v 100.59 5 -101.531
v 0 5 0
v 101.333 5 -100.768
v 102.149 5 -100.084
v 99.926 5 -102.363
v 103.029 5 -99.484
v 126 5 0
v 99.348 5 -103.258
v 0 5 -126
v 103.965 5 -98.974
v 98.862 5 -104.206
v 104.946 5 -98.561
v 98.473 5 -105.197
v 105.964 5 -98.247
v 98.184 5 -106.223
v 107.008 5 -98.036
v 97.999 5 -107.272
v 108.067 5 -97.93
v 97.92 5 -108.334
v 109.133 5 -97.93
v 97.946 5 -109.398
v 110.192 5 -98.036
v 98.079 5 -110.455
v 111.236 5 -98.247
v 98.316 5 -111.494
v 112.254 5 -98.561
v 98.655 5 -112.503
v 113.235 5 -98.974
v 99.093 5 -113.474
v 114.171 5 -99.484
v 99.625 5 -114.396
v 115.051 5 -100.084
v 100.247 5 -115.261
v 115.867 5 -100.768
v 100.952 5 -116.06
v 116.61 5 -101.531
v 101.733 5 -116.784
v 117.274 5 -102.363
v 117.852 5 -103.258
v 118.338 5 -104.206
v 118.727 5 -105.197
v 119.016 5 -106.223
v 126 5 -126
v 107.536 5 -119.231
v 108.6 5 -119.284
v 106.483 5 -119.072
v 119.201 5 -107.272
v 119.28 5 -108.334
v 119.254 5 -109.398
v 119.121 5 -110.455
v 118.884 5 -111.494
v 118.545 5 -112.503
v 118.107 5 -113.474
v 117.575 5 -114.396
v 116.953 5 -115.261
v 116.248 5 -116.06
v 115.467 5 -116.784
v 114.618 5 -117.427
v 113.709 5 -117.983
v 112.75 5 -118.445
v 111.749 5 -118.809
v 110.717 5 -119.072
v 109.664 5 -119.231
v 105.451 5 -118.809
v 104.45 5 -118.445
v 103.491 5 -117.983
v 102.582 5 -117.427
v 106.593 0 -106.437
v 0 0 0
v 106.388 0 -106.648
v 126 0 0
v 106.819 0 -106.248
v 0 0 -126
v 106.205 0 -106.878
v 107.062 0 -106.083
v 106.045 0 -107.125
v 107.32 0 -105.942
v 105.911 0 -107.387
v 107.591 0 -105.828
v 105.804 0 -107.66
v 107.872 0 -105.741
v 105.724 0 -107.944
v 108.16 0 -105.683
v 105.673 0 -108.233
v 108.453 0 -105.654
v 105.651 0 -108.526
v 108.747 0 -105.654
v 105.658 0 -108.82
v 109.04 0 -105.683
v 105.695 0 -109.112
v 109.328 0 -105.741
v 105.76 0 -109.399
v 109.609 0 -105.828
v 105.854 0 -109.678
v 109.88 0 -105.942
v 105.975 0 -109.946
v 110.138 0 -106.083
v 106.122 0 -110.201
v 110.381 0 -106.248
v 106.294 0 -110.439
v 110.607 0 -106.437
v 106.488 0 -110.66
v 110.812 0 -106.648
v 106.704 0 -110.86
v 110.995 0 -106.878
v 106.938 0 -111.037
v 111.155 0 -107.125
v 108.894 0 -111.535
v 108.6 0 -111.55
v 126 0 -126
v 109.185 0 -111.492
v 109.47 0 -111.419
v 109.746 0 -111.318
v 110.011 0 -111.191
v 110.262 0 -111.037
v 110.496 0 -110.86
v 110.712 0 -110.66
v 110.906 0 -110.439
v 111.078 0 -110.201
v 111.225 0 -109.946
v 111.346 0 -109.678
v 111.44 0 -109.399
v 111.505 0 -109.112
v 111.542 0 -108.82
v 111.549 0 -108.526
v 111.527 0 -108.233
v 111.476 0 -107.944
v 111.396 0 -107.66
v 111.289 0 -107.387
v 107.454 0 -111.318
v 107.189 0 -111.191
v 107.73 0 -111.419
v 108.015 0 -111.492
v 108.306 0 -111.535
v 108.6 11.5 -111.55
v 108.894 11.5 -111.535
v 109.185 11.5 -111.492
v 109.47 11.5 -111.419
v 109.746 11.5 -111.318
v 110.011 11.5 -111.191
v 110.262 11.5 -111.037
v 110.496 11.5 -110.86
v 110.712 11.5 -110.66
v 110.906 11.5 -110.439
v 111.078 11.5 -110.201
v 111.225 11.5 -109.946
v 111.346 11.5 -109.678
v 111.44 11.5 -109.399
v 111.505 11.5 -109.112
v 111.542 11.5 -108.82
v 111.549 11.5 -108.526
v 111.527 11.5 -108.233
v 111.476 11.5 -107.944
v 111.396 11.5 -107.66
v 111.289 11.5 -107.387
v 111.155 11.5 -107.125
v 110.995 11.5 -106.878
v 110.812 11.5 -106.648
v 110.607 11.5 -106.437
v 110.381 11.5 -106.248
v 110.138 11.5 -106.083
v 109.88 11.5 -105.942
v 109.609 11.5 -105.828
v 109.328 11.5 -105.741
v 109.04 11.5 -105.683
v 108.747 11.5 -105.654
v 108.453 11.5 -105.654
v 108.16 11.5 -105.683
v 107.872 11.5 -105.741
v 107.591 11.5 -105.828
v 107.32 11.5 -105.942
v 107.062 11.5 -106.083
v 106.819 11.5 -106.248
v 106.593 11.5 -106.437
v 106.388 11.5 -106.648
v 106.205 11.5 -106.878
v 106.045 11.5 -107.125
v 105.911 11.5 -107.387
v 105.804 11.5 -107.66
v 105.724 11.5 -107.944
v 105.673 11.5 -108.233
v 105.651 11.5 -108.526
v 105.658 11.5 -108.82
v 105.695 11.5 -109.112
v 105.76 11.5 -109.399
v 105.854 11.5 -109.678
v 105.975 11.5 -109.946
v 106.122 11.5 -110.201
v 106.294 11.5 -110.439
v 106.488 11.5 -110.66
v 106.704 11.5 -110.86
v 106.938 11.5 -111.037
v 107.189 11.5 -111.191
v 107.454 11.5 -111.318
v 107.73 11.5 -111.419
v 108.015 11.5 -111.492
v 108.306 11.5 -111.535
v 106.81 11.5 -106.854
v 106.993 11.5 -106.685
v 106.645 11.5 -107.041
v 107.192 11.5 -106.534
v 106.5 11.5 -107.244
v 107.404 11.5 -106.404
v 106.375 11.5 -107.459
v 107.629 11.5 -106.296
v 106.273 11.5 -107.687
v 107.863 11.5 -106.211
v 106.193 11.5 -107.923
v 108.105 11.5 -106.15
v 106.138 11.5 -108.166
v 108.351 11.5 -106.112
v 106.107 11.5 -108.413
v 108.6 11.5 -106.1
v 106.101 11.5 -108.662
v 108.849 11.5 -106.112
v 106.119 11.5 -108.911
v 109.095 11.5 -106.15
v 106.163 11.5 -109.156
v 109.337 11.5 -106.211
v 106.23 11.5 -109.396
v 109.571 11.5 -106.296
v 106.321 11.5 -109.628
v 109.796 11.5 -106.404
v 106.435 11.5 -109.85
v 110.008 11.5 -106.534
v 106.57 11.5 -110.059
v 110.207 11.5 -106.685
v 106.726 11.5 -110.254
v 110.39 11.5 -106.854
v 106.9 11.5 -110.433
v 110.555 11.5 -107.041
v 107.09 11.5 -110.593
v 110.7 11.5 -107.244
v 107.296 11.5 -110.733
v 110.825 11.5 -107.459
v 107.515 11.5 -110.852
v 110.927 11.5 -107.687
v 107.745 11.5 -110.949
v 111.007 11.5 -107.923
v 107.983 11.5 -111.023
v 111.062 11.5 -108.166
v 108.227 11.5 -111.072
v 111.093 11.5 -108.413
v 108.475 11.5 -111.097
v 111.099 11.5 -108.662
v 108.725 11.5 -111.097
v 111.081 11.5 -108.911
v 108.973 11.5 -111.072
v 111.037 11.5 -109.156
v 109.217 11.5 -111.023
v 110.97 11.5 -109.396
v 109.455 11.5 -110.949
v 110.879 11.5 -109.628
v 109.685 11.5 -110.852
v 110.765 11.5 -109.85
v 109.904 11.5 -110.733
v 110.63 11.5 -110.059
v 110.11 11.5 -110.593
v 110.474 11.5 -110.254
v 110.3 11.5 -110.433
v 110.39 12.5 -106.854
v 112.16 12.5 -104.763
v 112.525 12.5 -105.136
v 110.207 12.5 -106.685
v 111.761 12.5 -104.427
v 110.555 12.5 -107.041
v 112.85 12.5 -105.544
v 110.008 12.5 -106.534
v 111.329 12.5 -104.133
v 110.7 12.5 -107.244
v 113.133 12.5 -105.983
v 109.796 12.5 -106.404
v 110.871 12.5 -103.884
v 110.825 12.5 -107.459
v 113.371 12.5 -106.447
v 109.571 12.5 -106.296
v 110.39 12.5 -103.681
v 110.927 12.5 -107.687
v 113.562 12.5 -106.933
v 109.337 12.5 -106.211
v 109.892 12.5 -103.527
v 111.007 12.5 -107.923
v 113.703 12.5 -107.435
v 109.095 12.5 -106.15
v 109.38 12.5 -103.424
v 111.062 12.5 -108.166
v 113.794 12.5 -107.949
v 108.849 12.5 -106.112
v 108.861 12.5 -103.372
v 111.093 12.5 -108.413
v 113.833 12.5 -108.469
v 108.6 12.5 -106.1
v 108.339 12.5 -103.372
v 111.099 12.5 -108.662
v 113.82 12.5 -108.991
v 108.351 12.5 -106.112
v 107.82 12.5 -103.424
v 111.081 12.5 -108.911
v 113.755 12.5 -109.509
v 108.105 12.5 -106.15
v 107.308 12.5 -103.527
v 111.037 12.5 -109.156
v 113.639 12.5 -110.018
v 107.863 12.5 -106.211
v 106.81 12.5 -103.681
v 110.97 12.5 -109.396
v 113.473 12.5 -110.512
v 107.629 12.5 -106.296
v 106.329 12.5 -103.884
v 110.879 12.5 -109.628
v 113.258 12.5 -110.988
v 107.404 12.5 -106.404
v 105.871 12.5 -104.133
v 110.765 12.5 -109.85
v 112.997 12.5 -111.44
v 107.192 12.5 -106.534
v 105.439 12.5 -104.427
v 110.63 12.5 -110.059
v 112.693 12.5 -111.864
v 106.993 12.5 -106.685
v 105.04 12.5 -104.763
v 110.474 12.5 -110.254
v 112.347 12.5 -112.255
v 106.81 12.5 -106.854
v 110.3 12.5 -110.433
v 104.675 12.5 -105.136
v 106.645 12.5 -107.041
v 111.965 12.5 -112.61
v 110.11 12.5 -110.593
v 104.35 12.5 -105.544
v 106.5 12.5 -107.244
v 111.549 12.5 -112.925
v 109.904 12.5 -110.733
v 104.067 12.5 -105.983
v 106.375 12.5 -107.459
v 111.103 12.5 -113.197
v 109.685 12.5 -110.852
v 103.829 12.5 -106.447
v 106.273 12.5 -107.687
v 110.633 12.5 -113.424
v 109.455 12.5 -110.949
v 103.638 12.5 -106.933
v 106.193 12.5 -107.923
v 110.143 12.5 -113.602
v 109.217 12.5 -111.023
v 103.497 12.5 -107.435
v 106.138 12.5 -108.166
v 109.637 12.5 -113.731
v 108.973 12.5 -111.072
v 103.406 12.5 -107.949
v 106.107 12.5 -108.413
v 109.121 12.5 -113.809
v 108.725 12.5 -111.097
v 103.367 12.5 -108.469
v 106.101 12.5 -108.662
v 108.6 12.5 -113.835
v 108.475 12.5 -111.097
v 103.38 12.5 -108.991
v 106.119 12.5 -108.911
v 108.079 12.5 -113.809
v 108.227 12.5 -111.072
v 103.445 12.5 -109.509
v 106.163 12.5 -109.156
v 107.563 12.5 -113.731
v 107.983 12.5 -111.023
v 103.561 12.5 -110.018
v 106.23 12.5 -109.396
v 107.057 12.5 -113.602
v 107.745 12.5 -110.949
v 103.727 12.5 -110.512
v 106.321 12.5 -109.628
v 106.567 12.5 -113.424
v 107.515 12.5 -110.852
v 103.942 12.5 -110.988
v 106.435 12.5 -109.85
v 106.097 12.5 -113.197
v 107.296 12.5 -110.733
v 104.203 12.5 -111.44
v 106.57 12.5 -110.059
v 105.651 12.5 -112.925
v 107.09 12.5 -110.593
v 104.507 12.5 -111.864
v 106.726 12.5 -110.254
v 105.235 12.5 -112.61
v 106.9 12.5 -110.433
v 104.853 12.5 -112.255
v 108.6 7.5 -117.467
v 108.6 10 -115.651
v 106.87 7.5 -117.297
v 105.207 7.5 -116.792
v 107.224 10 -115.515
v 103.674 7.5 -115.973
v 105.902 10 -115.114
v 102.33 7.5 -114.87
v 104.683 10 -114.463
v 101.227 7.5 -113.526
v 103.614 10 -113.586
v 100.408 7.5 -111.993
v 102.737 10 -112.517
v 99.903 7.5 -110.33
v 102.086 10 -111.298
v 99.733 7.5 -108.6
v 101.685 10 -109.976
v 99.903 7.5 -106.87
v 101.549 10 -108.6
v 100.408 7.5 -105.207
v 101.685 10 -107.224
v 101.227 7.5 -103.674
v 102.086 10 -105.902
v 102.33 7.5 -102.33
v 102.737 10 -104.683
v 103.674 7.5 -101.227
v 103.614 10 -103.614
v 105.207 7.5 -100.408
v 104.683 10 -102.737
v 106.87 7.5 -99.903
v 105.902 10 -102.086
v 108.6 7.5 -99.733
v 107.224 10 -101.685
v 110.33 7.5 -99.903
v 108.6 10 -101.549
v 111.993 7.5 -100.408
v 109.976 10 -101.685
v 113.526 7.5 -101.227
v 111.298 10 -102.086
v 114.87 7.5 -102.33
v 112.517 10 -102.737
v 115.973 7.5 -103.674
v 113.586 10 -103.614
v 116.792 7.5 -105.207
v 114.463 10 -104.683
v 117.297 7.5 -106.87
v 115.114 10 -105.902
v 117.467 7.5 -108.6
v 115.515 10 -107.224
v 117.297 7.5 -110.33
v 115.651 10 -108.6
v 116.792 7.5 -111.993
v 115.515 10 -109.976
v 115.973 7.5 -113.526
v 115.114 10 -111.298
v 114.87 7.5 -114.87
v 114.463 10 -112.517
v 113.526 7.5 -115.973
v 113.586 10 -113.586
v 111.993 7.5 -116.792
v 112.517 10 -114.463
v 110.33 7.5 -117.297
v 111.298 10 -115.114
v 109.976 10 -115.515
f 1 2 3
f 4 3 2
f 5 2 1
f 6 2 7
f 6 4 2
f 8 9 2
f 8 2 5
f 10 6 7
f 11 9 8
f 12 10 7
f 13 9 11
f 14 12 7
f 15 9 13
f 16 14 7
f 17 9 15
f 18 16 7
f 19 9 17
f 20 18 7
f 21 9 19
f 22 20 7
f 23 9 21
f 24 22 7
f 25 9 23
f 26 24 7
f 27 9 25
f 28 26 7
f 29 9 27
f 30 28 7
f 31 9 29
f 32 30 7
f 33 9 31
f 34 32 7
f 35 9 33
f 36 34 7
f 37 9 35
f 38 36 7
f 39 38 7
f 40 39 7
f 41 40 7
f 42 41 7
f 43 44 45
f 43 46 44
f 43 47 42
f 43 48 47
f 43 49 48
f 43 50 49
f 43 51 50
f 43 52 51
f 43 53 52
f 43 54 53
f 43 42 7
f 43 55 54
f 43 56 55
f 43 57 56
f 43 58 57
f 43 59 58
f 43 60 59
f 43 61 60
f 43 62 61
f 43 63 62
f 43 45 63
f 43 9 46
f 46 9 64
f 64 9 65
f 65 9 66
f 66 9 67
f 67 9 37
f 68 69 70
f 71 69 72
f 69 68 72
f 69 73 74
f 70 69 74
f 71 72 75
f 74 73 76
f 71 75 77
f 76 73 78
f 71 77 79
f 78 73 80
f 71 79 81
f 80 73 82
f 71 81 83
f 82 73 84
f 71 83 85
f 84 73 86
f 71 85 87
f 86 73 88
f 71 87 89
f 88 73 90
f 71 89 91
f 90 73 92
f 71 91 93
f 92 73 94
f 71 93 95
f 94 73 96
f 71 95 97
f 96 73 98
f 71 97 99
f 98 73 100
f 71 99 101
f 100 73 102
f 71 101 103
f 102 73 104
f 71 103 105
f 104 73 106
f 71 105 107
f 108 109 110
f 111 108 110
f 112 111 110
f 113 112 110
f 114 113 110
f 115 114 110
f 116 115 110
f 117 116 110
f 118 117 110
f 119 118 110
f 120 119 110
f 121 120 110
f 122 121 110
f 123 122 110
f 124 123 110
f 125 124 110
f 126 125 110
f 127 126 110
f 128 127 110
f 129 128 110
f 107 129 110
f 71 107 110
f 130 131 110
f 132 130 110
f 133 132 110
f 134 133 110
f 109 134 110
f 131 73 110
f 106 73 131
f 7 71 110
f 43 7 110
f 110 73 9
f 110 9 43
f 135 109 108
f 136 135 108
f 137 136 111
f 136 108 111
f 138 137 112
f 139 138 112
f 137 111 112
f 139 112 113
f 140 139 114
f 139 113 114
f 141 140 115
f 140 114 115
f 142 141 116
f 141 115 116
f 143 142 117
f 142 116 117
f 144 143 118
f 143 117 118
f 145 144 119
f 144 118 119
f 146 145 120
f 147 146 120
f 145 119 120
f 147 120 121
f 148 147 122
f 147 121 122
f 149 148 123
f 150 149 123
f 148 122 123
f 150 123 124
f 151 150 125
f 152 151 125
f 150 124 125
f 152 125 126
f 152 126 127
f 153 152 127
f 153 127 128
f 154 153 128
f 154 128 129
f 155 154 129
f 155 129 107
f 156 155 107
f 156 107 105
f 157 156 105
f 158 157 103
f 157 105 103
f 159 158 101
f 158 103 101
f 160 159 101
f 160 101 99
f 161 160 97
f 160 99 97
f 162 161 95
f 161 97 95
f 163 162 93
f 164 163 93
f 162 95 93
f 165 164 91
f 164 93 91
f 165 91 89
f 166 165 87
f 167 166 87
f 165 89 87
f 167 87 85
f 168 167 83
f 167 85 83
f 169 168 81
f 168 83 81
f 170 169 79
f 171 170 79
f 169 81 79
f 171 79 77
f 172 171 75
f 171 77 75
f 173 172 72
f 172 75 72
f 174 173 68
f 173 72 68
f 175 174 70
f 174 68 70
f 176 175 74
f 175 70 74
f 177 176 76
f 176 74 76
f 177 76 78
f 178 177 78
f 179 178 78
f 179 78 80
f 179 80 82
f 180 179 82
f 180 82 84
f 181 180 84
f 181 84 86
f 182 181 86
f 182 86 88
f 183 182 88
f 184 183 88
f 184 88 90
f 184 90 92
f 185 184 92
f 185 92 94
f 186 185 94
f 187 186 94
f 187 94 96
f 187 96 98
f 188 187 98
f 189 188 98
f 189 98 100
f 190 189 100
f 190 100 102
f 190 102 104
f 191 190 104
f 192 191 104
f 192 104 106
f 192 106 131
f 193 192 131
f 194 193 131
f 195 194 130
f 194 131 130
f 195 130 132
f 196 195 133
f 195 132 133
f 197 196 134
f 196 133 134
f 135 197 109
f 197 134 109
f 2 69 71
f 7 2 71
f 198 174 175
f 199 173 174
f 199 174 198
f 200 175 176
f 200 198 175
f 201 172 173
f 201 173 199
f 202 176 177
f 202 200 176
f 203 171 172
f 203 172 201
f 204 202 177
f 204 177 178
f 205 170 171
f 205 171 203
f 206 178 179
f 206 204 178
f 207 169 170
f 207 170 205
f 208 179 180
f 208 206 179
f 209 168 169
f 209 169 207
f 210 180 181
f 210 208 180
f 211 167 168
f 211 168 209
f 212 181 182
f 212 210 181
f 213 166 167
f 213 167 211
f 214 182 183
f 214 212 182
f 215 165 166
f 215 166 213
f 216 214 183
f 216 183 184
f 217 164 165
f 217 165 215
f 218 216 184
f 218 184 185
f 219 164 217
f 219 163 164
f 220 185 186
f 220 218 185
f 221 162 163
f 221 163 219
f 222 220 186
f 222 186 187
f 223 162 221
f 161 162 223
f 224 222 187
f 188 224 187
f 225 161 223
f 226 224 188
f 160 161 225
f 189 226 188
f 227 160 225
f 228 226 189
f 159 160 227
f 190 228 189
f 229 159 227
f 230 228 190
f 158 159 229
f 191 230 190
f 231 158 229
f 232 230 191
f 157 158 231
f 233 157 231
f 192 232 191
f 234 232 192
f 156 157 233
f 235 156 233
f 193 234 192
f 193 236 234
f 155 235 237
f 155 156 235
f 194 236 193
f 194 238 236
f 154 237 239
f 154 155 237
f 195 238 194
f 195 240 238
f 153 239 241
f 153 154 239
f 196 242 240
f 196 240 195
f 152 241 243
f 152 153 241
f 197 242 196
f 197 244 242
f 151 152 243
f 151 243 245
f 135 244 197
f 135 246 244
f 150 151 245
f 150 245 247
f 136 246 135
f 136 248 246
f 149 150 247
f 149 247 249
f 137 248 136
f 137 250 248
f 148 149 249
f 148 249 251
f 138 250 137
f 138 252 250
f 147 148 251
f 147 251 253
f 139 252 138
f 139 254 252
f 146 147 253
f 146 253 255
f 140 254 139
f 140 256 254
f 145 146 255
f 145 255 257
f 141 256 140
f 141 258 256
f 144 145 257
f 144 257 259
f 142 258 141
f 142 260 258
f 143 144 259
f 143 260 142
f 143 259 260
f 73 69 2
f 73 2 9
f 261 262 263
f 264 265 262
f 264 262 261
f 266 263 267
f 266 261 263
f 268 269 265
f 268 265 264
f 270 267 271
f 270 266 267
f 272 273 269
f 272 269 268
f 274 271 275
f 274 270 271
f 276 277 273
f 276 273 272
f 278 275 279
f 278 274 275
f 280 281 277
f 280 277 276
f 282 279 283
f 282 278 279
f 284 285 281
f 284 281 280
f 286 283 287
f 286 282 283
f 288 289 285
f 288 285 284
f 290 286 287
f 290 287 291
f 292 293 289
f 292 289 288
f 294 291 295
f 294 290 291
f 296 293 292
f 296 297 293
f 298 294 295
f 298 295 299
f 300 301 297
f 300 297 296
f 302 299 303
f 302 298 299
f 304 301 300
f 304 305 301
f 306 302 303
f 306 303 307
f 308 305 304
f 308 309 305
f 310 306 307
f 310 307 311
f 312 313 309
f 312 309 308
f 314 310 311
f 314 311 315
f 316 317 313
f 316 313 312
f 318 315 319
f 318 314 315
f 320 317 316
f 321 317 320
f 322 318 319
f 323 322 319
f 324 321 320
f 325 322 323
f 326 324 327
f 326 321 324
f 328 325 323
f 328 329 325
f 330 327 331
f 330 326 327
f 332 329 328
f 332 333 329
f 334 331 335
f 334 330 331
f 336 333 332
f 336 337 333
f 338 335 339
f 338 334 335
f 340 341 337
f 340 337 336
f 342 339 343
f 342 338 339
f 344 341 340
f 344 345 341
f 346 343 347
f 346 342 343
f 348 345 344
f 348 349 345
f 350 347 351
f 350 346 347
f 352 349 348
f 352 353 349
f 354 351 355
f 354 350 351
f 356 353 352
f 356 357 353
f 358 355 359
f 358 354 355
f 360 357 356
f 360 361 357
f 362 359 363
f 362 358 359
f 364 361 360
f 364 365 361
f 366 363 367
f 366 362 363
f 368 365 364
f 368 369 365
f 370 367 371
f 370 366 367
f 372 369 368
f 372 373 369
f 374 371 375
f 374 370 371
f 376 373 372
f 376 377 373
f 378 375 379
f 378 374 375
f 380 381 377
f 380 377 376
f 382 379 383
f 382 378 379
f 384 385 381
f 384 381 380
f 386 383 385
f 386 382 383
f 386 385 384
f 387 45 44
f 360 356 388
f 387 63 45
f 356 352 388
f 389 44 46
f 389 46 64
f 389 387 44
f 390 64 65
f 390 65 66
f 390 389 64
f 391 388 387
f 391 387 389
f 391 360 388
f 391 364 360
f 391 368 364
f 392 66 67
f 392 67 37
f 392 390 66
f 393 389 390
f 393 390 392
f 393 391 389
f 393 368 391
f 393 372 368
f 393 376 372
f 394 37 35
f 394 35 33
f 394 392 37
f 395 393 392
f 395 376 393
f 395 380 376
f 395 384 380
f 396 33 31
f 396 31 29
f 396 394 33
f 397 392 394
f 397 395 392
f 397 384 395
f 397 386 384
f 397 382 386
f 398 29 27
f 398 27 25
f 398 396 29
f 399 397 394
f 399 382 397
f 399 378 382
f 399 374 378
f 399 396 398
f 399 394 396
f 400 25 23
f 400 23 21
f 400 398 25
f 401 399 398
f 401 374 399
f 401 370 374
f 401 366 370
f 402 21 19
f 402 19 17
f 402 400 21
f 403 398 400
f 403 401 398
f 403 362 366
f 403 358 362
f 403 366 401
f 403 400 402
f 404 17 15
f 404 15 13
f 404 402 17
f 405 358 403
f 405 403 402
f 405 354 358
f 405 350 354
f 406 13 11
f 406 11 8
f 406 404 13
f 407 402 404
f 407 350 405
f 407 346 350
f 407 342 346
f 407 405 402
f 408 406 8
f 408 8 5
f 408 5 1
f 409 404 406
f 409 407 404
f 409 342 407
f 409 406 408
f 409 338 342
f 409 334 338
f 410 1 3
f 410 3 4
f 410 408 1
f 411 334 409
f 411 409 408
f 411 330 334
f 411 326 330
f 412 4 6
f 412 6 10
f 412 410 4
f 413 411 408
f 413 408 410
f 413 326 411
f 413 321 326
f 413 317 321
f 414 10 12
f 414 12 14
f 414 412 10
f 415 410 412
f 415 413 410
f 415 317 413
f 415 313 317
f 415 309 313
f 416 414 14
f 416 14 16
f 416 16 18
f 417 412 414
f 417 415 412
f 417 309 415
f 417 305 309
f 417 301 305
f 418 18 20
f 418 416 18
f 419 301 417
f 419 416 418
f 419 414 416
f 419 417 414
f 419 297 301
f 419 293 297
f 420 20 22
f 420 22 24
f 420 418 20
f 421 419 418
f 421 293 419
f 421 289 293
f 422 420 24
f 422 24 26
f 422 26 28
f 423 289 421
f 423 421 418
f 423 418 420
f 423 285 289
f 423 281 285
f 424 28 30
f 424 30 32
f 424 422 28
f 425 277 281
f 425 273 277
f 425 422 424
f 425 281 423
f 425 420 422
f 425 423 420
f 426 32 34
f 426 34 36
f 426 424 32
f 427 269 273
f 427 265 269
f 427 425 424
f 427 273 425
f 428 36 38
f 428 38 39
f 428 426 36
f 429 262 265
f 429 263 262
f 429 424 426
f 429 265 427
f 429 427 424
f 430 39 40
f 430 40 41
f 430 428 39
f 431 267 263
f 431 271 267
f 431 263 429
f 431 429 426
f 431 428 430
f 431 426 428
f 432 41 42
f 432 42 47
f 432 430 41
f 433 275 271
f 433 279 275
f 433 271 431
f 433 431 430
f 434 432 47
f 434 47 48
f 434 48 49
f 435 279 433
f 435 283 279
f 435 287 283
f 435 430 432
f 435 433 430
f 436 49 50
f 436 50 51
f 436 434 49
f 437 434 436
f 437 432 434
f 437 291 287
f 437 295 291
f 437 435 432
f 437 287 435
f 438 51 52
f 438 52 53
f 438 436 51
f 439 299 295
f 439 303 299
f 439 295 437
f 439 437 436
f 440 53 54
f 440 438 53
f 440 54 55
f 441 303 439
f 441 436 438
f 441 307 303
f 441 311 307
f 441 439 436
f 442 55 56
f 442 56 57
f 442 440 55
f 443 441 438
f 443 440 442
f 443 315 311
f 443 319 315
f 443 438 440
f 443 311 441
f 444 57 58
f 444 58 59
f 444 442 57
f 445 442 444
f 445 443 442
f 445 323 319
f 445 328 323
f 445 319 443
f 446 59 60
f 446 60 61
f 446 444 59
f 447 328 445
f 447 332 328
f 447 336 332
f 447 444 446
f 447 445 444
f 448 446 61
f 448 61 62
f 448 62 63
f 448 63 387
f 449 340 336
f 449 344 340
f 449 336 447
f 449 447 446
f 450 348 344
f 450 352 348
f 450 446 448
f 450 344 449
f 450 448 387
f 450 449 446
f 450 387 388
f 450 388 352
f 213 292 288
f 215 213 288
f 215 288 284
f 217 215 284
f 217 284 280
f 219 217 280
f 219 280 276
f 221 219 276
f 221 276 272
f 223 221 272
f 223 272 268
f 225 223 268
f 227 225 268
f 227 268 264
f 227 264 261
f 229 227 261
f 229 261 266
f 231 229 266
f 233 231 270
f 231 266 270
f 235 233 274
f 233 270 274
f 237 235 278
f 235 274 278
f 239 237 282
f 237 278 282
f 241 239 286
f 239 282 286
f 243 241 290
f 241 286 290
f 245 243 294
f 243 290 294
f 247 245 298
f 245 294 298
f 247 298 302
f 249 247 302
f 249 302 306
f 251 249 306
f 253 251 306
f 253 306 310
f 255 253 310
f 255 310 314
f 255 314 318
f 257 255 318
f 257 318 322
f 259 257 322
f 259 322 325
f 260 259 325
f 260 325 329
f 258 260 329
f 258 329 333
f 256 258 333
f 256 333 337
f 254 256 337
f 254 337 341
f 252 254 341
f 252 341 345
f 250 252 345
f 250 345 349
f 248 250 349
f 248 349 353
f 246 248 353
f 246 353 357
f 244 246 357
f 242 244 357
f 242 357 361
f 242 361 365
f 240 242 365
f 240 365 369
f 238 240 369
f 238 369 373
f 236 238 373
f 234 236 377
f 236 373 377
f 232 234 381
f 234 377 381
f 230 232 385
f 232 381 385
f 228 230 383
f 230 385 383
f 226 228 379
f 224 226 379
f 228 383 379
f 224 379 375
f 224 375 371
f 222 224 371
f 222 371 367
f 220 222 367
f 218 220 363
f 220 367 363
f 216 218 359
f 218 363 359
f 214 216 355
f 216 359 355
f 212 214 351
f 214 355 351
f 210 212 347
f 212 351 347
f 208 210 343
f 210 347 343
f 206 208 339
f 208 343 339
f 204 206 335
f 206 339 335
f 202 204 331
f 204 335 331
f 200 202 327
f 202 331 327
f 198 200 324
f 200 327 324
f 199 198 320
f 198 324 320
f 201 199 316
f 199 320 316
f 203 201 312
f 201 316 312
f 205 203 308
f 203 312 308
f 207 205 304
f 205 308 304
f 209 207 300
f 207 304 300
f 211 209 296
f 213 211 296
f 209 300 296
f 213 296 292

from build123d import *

# Parameters (mm, degrees)
SKETCH1_W           = 126
SKETCH1_H           = 126
BOSS_EXTRUDE1_DEPTH = 5
SKETCH3_R           = 12.5
BOSS_EXTRUDE2_DEPTH = 7.5
SKETCH4_R           = 2.95
CUT_EXTRUDE1_DEPTH  = 11.5
SKETCH6_R           = 2.5
CUT_EXTRUDE2_DEPTH  = 179.628805068
CHAMFER1_SIZE       = 10
CHAMFER1_SIZE_2     = 7.26542528


with BuildPart() as part:
    # Sketch1 → Boss-Extrude1 (new body)
    with BuildSketch(Plane(origin=(0, 0, 0), x_dir=(1, 0, 0), z_dir=(0, 1, 0))):
        with Locations((63, 63)):
            Rectangle(SKETCH1_W, SKETCH1_H)
    extrude(amount=BOSS_EXTRUDE1_DEPTH)

    # Sketch3 → Boss-Extrude2 (add)
    with BuildSketch(Plane(origin=(0, 5, 0), x_dir=(1, 0, 0), z_dir=(0, 1, 0))):
        with Locations(Location((108.6, 108.6, 0), (0, 0, 90))):
            Circle(SKETCH3_R)
    extrude(amount=BOSS_EXTRUDE2_DEPTH)

    # Sketch4 → Cut-Extrude1 (cut)
    with BuildSketch(Plane.XZ):
        with Locations(Location((108.6, -108.6, 0), (0, 0, 270))):
            Circle(SKETCH4_R)
    extrude(amount=-CUT_EXTRUDE1_DEPTH, mode=Mode.SUBTRACT)

    # Sketch6 → Cut-Extrude2 (cut, through all)
    with BuildSketch(Plane(origin=(0, 12.5, 0), x_dir=(1, 0, 0), z_dir=(0, 1, 0))):
        with Locations(Location((108.6, 108.6, 0), (0, 0, 270))):
            Circle(SKETCH6_R)
    extrude(amount=-CUT_EXTRUDE2_DEPTH, mode=Mode.SUBTRACT)

    # Chamfer1
    # the kernel refuses this chamfer: 10, 7.26542528 mm, written as the material it takes off along each edge
    with BuildSketch(Plane(origin=(108.6, 12.5, -108.6), x_dir=(0, 0, -1), z_dir=(1, 0, 0))) as chamfer1_piece_1_section:
        Polygon((12.5, -CHAMFER1_SIZE), (12.5 - CHAMFER1_SIZE_2, 0), (12.5, 0), align=None)
    chamfer1_piece_1 = revolve(axis=Axis((108.6, 12.5, -108.6), (0, 1, 0)), mode=Mode.PRIVATE)
    chamfer1_piece_1 = split(chamfer1_piece_1, bisect_by=Plane(origin=(108.6, 5, -100.650989912), z_dir=(0, 1, 0)), keep=Keep.TOP, mode=Mode.PRIVATE)
    add(chamfer1_piece_1, mode=Mode.SUBTRACT)


solid = part.part
